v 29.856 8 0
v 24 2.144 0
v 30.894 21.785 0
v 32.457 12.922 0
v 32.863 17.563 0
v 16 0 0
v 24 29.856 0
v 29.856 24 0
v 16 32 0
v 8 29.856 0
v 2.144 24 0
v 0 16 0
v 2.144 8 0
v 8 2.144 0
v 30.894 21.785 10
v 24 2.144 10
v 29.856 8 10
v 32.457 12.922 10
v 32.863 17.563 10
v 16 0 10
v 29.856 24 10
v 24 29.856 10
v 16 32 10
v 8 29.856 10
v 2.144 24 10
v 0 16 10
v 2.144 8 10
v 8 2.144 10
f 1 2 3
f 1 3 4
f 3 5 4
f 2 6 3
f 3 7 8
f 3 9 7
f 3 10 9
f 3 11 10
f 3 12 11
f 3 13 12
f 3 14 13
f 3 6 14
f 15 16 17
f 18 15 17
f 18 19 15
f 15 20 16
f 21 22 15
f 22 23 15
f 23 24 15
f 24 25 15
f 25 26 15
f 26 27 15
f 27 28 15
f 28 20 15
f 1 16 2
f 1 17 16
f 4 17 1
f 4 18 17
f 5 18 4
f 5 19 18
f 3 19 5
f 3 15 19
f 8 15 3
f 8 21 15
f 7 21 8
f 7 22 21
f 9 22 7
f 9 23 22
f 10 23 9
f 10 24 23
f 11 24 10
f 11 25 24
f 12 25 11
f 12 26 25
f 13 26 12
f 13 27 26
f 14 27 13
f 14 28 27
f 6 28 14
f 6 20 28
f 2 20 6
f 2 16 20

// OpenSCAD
$fn = 32;

// ----------------------------------------------------------------------
// Eccentric disc: egg, 10 mm thick
// ----------------------------------------------------------------------

// --- parameters (mm) ---
profile_height = 10;      // extrusion height
profile_points = 14;      // points of the closed outline

profile = [[0, 16], [2.144, 8], [8, 2.144], [16, 0], [24, 2.144], [29.856, 8], [32.457, 12.922], [32.863, 17.563], [30.894, 21.785], [29.856, 24], [24, 29.856], [16, 32], [8, 29.856], [2.144, 24]];  // single closed polygon, 14 points, counter clockwise

// --- the one profile operation ---
linear_extrude(height = profile_height) polygon(points = profile);
